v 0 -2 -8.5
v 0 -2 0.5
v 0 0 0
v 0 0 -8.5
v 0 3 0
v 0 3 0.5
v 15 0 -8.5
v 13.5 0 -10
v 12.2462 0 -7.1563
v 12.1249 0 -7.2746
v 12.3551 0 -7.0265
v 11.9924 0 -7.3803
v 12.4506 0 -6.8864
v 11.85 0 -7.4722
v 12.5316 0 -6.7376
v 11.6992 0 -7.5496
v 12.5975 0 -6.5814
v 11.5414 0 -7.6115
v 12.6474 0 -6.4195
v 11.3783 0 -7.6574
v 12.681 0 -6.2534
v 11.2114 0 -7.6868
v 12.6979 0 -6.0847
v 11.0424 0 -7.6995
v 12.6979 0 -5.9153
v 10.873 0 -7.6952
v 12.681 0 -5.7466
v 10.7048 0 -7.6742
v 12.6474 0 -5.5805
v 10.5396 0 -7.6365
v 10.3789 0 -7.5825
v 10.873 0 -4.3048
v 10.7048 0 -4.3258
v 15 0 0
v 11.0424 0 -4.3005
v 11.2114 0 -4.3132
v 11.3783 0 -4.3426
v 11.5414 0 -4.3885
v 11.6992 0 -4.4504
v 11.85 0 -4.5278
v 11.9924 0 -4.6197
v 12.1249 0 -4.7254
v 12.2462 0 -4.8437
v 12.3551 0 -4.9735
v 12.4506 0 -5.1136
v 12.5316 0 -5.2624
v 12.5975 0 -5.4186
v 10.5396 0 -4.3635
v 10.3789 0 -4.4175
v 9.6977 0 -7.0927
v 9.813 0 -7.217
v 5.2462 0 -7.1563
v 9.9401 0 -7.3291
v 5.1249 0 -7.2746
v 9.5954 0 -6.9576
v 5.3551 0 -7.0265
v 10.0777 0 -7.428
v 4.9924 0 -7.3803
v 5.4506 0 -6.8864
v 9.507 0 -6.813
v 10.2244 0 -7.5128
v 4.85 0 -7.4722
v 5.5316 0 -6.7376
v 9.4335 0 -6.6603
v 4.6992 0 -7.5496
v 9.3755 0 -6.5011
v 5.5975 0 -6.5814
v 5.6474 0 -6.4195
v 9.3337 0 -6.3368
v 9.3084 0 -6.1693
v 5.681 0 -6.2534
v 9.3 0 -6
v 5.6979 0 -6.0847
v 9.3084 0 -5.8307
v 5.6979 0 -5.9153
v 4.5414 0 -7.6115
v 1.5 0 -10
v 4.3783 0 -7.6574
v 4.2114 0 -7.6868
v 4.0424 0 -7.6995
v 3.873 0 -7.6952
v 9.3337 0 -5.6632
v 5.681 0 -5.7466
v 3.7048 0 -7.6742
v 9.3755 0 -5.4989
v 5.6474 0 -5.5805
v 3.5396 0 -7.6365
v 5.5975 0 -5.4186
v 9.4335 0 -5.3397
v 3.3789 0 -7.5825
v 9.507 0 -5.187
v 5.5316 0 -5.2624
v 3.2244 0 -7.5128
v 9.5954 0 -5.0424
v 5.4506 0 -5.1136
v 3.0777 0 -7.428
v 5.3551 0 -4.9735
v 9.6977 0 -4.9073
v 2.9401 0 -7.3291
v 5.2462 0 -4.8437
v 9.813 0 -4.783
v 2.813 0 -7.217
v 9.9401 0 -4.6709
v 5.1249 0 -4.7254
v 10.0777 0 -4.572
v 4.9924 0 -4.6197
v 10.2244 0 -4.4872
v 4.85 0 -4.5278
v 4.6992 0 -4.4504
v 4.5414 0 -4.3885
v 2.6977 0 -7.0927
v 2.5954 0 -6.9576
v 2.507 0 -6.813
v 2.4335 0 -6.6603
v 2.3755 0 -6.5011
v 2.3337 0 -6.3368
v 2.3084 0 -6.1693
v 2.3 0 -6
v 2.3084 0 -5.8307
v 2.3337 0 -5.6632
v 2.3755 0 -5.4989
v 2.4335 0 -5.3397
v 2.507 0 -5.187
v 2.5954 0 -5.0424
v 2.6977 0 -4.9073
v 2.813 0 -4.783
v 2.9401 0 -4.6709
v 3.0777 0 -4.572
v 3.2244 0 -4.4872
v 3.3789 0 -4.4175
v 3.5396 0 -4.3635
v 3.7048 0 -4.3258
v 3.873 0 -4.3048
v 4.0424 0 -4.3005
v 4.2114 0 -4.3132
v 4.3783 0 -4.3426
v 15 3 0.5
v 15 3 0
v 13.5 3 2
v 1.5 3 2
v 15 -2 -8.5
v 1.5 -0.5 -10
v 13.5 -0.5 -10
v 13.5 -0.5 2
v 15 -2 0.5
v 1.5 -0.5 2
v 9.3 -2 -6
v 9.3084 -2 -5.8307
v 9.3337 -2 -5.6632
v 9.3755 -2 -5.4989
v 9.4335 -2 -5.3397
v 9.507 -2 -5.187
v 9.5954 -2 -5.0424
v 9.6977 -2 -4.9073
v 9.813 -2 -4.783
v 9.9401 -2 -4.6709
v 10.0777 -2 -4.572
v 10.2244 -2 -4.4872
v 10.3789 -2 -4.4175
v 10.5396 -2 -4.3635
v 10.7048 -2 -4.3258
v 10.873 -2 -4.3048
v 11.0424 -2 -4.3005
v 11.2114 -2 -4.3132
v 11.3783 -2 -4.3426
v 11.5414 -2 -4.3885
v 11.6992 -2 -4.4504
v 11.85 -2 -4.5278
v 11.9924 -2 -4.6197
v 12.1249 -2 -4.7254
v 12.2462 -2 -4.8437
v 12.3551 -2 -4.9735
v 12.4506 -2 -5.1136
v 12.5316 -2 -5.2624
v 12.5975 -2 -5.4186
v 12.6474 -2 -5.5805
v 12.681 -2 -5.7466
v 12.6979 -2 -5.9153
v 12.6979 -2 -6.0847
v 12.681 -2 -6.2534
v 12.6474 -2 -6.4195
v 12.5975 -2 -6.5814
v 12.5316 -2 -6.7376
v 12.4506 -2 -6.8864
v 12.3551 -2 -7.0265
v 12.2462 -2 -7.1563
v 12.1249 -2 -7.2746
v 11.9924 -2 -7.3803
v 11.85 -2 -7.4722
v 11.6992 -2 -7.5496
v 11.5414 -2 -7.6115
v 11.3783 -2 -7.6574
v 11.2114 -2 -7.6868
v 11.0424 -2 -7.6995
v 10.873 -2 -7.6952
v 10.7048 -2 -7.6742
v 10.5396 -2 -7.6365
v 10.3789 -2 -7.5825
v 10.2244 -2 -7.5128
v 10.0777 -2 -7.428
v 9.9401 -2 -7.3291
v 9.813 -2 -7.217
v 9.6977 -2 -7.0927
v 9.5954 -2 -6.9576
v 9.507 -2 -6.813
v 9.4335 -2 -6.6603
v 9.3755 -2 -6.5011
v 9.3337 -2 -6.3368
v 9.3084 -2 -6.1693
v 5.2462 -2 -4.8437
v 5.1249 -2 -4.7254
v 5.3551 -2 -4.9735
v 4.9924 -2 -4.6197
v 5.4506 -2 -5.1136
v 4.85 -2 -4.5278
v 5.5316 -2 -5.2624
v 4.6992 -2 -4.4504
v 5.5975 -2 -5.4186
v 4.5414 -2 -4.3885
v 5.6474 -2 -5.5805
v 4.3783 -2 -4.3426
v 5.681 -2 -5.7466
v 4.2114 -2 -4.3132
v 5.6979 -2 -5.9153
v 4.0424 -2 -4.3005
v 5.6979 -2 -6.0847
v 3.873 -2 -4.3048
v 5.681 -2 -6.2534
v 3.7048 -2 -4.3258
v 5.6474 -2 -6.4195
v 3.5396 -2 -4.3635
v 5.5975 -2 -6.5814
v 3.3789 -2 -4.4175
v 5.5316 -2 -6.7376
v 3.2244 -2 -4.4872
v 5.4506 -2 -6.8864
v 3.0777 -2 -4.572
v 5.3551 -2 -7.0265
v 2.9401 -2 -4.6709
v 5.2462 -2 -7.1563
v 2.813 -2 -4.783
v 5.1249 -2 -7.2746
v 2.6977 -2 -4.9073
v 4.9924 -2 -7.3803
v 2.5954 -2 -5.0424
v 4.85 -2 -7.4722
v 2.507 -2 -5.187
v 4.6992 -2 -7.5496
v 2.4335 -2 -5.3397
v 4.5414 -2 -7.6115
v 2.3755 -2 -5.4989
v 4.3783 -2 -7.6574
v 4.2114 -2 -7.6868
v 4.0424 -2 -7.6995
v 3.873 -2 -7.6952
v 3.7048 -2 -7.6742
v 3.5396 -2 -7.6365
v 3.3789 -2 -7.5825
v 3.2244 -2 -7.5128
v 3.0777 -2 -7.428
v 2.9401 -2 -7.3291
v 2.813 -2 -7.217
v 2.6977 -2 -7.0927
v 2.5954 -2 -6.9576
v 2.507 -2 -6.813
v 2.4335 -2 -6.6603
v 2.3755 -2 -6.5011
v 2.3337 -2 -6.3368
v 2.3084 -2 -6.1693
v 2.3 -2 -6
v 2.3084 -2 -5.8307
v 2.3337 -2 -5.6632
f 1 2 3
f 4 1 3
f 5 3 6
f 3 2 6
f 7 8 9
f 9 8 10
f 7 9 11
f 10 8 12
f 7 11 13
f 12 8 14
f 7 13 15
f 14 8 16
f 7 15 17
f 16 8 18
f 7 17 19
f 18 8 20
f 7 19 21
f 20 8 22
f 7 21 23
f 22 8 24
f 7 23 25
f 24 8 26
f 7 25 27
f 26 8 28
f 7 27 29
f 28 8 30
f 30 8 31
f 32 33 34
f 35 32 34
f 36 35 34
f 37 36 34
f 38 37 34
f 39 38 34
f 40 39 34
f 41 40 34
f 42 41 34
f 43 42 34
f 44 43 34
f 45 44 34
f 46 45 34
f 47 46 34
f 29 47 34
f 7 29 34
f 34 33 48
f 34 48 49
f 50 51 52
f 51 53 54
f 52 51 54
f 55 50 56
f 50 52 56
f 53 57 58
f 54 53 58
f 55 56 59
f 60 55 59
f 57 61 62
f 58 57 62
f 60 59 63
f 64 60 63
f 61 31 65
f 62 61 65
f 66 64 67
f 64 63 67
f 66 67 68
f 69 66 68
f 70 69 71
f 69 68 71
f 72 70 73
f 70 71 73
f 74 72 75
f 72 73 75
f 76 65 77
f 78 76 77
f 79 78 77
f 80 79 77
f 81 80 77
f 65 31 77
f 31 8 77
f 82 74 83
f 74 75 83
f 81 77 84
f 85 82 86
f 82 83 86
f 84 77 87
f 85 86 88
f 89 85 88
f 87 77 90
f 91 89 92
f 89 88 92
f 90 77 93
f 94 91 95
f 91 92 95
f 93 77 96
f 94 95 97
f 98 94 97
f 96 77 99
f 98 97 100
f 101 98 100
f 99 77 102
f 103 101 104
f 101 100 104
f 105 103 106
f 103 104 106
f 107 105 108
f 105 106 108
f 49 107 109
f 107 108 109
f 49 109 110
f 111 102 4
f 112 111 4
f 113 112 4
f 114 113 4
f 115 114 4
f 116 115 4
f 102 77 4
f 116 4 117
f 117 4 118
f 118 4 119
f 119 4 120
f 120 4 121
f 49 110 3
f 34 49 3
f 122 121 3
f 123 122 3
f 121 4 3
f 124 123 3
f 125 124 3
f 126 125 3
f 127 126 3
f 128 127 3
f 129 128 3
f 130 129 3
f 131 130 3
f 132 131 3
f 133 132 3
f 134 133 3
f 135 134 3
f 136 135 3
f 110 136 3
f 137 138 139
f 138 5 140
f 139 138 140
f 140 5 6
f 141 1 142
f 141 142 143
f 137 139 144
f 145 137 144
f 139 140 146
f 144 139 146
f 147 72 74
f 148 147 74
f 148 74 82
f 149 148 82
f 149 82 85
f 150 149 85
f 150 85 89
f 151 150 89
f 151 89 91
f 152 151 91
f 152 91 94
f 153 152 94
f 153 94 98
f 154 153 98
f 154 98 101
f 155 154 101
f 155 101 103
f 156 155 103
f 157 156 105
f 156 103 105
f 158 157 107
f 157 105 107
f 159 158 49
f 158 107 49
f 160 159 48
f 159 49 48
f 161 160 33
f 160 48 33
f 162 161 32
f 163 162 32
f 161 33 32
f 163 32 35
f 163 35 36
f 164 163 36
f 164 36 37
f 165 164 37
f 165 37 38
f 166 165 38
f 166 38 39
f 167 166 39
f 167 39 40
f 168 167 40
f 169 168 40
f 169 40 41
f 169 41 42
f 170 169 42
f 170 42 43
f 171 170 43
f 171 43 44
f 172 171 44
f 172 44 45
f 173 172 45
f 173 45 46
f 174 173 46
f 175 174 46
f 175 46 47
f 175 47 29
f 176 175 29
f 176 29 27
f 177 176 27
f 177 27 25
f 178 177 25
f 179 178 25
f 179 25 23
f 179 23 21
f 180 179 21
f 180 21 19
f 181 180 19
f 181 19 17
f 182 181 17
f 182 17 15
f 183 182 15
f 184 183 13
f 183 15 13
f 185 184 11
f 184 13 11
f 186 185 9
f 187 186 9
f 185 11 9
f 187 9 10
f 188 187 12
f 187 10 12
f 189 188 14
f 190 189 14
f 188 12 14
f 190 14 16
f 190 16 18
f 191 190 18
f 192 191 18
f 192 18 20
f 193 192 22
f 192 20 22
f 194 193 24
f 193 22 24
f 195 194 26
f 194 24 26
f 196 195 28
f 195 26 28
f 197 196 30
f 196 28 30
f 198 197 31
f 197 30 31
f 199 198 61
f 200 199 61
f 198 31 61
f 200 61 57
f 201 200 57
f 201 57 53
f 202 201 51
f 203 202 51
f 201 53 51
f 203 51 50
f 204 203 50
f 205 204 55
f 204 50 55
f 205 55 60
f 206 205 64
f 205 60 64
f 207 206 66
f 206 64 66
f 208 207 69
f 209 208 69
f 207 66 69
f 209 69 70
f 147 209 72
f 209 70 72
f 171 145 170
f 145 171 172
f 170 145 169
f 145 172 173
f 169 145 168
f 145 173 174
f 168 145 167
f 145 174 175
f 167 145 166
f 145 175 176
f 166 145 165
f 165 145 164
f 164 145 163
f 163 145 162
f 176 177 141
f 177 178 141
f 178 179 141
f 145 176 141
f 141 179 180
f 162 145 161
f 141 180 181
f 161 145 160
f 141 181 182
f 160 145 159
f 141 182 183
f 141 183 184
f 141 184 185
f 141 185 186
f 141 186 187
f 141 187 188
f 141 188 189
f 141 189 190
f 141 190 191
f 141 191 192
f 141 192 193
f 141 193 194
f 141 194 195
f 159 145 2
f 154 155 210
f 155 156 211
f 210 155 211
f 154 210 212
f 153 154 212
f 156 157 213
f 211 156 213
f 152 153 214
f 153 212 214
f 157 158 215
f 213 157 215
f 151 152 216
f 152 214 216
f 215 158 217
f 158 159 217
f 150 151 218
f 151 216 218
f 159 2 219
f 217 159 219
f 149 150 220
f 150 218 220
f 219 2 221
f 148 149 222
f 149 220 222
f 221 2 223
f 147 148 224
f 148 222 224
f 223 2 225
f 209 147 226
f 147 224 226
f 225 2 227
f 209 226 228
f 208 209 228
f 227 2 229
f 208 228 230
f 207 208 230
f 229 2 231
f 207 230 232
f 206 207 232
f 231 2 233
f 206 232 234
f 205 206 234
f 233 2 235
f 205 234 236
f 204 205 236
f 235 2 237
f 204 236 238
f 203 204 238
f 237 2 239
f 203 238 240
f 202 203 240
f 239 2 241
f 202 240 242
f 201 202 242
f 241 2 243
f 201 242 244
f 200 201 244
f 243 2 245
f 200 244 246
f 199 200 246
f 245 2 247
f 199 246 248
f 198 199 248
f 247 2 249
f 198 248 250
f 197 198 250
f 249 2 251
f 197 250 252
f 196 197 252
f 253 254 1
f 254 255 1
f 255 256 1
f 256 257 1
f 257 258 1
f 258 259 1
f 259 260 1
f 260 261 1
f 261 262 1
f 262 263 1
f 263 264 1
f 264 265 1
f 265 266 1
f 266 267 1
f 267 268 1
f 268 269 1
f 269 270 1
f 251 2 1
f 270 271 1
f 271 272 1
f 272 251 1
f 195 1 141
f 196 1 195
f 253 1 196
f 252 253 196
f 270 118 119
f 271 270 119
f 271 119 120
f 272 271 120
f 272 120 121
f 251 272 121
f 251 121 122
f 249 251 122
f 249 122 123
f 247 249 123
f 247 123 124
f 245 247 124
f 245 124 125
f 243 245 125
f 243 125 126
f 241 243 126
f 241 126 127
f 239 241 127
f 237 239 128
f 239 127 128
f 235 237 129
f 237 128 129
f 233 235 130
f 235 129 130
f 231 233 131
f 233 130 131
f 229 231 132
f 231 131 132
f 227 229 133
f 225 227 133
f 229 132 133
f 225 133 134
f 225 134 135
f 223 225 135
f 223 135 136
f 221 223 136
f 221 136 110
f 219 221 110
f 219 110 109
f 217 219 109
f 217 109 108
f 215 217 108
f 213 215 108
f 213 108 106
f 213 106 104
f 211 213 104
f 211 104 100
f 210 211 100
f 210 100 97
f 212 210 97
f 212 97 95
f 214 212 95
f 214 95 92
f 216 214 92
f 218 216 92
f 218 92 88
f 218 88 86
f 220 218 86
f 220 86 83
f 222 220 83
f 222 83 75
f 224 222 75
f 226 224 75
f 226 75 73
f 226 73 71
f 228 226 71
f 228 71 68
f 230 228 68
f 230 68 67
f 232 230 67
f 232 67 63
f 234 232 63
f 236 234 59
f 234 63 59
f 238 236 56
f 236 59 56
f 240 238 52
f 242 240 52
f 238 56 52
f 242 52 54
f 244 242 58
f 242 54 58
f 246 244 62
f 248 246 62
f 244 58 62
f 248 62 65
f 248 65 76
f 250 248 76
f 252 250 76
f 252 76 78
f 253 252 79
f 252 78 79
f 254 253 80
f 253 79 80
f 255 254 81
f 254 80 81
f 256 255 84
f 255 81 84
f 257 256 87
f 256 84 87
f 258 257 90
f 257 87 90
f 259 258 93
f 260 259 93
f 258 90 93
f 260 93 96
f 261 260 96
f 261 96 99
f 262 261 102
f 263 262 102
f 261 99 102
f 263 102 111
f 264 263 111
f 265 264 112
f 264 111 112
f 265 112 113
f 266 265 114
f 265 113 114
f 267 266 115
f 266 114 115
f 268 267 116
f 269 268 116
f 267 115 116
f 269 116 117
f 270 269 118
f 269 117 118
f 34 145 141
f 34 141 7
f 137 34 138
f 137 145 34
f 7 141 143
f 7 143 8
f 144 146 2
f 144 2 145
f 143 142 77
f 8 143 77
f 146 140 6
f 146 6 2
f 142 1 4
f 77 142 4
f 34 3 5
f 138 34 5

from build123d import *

# Parameters (mm, degrees)
F1_DEPTH = 15
F3_D     = 3.4
F4_SIZE  = 1.5


with BuildPart() as f1:
    # F0 (on Right) → F1 (new body)
    with BuildSketch(Plane.YZ):
        Polygon((0, -10), (0, 0), (3, 0), (3, 2), (-2, 2), (-2, -10), align=None)
    extrude(amount=F1_DEPTH)

    # F3 (through all)
    with Locations(Plane.XZ.offset(2)):
        with Locations((4, -6), (11, -6)):
            Hole(F3_D / 2)

    # F4
    f4_edges = [f1.edges().sort_by_distance(p)[0] for p in [
        (0, 0.5, 2),
        (15, 0.5, 2),
        (0, -1, -10),
        (15, -1, -10),
        (7.5, -2, 2),
        (7.5, -2, -10),
    ]]
    chamfer(f4_edges, length=F4_SIZE)


solid = f1.part
